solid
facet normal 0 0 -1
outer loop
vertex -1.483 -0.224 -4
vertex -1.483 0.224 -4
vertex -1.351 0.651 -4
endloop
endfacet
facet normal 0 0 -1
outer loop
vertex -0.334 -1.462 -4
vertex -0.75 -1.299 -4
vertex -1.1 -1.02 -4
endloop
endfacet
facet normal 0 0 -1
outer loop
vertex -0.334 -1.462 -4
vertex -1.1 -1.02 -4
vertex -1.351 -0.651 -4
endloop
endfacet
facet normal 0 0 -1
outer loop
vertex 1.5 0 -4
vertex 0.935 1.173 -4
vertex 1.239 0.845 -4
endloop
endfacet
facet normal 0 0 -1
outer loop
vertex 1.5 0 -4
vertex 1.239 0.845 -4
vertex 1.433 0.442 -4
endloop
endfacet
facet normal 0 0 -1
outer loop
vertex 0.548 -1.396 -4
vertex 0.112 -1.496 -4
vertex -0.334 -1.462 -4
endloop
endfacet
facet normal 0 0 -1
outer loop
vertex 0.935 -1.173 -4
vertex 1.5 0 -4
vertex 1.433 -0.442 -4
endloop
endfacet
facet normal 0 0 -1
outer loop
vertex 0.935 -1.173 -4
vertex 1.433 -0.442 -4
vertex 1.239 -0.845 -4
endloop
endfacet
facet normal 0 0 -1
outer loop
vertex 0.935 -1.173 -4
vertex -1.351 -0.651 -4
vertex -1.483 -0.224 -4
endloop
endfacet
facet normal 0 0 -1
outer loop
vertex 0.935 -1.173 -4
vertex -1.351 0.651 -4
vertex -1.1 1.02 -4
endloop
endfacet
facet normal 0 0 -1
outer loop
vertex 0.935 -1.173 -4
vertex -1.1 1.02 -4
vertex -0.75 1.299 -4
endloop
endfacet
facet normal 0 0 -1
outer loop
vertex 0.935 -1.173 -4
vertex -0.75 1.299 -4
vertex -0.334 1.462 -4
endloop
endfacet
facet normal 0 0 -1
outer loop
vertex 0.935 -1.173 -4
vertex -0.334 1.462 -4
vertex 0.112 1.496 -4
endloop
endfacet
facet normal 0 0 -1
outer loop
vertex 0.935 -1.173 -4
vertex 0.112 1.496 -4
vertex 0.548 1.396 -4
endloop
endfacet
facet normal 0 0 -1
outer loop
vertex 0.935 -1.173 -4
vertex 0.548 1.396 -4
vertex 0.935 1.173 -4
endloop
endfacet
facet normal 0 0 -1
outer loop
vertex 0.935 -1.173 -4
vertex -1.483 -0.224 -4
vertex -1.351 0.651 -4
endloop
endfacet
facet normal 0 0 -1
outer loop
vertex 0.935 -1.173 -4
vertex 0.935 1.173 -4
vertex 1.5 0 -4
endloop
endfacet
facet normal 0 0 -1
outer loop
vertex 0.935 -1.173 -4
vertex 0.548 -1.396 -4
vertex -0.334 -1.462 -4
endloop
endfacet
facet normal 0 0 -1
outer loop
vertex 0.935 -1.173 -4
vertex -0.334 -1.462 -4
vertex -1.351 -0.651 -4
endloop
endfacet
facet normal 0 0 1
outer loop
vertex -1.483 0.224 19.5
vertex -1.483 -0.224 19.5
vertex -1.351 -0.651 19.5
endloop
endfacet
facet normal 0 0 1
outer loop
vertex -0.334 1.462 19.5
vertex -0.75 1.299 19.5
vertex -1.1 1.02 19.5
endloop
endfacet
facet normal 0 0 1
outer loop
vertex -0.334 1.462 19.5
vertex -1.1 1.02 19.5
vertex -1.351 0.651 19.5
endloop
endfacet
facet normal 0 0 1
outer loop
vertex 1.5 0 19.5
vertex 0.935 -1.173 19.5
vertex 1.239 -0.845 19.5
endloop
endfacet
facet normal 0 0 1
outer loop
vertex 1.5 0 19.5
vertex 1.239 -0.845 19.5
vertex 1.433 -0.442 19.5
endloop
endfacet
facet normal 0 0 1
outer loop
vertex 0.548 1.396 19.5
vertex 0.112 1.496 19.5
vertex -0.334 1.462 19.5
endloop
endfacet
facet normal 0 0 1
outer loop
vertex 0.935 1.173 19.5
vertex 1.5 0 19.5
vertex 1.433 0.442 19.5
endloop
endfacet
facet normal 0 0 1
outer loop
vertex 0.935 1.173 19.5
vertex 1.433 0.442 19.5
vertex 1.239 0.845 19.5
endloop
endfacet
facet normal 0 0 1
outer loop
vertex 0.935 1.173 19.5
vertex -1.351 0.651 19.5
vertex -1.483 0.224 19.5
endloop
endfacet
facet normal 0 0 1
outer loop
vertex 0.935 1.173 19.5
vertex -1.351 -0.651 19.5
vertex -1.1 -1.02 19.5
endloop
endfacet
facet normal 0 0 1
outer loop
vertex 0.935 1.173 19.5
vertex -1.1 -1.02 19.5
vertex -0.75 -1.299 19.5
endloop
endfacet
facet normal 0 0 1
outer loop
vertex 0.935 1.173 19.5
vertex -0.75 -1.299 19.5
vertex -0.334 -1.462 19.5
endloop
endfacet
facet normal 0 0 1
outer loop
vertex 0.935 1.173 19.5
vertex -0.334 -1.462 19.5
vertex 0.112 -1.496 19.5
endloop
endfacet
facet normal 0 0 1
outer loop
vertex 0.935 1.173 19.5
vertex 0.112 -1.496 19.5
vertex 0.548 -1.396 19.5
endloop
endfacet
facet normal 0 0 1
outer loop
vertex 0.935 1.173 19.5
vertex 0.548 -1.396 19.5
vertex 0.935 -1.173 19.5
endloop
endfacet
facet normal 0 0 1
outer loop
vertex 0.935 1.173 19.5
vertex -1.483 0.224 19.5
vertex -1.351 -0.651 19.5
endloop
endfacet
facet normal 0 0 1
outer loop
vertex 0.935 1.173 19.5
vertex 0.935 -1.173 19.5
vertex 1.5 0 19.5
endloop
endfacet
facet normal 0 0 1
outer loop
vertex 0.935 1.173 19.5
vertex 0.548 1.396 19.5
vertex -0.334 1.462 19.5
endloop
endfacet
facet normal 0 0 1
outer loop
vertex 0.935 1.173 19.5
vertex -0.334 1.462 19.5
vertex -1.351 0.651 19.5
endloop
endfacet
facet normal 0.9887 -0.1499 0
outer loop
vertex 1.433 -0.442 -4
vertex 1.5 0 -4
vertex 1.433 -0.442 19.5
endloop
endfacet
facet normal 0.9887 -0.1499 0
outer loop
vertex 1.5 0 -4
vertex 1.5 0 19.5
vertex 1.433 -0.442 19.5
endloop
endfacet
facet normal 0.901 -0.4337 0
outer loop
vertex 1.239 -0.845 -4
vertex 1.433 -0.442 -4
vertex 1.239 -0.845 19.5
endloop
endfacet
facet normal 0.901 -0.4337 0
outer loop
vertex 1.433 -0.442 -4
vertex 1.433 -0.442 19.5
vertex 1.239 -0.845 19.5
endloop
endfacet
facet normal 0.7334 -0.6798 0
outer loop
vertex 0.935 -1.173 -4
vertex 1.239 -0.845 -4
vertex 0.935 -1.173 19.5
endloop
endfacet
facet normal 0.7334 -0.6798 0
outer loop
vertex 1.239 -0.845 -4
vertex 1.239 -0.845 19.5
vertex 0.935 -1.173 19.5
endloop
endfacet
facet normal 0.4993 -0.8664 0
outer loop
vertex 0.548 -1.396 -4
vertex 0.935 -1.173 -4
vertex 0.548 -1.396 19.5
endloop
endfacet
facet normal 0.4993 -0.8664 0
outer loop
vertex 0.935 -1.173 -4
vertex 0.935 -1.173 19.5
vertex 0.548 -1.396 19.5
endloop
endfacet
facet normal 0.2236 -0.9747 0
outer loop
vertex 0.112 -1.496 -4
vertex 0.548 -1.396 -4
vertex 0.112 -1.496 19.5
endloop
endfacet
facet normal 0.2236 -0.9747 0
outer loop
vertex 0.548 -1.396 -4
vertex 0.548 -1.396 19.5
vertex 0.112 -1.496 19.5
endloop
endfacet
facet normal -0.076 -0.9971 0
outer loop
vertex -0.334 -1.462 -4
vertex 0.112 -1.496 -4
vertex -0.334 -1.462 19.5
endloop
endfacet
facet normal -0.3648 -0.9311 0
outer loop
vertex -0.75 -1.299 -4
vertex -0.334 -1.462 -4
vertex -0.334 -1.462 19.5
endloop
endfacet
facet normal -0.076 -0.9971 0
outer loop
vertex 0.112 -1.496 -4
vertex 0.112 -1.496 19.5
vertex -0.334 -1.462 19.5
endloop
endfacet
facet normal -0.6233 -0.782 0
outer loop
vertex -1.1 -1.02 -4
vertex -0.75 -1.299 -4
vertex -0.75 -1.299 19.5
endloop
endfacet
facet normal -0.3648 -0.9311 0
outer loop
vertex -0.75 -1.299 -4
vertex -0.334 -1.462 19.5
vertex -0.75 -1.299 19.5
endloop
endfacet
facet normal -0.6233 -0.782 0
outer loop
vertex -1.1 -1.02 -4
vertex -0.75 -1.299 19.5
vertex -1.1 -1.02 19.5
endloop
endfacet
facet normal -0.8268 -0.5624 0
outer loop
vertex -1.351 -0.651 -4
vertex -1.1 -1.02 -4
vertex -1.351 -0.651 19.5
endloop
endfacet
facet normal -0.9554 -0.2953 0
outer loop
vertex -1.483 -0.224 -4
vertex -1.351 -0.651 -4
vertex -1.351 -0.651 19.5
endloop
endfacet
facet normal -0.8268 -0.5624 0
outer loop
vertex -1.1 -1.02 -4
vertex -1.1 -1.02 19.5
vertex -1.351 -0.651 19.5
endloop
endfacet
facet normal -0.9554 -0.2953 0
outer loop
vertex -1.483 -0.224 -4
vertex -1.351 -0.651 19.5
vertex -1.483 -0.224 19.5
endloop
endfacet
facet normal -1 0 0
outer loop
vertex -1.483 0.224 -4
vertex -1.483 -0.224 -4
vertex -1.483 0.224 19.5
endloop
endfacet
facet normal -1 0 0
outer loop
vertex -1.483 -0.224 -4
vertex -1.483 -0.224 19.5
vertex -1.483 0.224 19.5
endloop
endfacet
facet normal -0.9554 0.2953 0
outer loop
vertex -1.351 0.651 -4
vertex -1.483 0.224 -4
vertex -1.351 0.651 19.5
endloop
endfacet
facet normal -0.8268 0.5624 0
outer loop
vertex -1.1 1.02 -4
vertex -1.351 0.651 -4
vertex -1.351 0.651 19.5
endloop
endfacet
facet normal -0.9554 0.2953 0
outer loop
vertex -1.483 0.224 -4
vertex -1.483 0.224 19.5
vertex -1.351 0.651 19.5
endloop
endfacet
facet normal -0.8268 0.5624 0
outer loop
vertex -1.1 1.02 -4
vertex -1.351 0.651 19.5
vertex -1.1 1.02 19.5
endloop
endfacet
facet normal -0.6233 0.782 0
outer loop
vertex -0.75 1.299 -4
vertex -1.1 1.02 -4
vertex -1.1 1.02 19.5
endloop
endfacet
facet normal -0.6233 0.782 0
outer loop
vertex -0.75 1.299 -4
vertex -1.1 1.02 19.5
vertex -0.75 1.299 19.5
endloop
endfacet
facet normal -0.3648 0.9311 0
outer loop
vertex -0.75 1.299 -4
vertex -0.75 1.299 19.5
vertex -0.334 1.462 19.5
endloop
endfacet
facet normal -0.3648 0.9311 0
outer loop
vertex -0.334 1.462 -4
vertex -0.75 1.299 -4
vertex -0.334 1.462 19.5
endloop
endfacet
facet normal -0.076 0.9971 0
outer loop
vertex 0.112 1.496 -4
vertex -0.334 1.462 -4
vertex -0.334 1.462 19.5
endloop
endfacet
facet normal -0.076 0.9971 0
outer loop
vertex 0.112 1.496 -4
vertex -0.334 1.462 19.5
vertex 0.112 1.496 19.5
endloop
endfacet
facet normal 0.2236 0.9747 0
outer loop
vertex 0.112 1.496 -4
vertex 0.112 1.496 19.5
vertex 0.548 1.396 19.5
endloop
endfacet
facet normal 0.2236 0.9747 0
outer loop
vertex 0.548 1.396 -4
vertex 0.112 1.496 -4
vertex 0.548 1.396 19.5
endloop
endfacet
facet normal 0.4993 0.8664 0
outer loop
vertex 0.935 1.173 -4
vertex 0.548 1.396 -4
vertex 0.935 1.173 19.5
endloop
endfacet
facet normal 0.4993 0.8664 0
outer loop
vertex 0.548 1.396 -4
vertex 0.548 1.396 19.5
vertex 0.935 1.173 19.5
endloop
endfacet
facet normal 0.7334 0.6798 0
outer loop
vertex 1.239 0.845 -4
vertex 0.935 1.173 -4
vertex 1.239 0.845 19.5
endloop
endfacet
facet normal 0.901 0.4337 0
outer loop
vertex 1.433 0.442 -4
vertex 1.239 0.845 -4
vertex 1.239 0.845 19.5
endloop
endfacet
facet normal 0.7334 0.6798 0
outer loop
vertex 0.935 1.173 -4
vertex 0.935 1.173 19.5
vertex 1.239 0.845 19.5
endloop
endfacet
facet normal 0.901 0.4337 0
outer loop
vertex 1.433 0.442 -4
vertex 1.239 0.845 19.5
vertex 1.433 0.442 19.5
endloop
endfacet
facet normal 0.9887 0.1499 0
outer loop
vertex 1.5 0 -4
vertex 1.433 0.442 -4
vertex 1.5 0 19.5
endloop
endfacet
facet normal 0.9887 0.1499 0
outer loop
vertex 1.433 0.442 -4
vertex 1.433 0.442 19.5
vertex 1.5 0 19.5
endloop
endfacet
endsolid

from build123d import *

# Parameters (mm, degrees)
SKETCH1_R           = 0.75
BOSS_EXTRUDE1_DEPTH = 19.5
SKETCH2_R           = 1.5
BOSS_EXTRUDE2_DEPTH = 19.5
SKETCH4_R           = 1.5
BOSS_EXTRUDE3_DEPTH = 4


with BuildPart() as part:
    # Sketch1 → Boss-Extrude1 (new body)
    with BuildSketch(Plane.XY):
        Circle(SKETCH1_R)
    extrude(amount=BOSS_EXTRUDE1_DEPTH)

    # Sketch2 → Boss-Extrude2 (add)
    with BuildSketch(Plane.XY.offset(19.5)):
        Circle(SKETCH2_R)
    extrude(amount=-BOSS_EXTRUDE2_DEPTH)

    # Sketch4 → Boss-Extrude3 (add)
    with BuildSketch(Plane(origin=(0, 0, 0), x_dir=(-1, 0, 0), z_dir=(0, 0, -1))):
        with Locations(Location((0, 0, 0), (0, 0, 180))):
            Circle(SKETCH4_R)
    extrude(amount=BOSS_EXTRUDE3_DEPTH)


solid = part.part
